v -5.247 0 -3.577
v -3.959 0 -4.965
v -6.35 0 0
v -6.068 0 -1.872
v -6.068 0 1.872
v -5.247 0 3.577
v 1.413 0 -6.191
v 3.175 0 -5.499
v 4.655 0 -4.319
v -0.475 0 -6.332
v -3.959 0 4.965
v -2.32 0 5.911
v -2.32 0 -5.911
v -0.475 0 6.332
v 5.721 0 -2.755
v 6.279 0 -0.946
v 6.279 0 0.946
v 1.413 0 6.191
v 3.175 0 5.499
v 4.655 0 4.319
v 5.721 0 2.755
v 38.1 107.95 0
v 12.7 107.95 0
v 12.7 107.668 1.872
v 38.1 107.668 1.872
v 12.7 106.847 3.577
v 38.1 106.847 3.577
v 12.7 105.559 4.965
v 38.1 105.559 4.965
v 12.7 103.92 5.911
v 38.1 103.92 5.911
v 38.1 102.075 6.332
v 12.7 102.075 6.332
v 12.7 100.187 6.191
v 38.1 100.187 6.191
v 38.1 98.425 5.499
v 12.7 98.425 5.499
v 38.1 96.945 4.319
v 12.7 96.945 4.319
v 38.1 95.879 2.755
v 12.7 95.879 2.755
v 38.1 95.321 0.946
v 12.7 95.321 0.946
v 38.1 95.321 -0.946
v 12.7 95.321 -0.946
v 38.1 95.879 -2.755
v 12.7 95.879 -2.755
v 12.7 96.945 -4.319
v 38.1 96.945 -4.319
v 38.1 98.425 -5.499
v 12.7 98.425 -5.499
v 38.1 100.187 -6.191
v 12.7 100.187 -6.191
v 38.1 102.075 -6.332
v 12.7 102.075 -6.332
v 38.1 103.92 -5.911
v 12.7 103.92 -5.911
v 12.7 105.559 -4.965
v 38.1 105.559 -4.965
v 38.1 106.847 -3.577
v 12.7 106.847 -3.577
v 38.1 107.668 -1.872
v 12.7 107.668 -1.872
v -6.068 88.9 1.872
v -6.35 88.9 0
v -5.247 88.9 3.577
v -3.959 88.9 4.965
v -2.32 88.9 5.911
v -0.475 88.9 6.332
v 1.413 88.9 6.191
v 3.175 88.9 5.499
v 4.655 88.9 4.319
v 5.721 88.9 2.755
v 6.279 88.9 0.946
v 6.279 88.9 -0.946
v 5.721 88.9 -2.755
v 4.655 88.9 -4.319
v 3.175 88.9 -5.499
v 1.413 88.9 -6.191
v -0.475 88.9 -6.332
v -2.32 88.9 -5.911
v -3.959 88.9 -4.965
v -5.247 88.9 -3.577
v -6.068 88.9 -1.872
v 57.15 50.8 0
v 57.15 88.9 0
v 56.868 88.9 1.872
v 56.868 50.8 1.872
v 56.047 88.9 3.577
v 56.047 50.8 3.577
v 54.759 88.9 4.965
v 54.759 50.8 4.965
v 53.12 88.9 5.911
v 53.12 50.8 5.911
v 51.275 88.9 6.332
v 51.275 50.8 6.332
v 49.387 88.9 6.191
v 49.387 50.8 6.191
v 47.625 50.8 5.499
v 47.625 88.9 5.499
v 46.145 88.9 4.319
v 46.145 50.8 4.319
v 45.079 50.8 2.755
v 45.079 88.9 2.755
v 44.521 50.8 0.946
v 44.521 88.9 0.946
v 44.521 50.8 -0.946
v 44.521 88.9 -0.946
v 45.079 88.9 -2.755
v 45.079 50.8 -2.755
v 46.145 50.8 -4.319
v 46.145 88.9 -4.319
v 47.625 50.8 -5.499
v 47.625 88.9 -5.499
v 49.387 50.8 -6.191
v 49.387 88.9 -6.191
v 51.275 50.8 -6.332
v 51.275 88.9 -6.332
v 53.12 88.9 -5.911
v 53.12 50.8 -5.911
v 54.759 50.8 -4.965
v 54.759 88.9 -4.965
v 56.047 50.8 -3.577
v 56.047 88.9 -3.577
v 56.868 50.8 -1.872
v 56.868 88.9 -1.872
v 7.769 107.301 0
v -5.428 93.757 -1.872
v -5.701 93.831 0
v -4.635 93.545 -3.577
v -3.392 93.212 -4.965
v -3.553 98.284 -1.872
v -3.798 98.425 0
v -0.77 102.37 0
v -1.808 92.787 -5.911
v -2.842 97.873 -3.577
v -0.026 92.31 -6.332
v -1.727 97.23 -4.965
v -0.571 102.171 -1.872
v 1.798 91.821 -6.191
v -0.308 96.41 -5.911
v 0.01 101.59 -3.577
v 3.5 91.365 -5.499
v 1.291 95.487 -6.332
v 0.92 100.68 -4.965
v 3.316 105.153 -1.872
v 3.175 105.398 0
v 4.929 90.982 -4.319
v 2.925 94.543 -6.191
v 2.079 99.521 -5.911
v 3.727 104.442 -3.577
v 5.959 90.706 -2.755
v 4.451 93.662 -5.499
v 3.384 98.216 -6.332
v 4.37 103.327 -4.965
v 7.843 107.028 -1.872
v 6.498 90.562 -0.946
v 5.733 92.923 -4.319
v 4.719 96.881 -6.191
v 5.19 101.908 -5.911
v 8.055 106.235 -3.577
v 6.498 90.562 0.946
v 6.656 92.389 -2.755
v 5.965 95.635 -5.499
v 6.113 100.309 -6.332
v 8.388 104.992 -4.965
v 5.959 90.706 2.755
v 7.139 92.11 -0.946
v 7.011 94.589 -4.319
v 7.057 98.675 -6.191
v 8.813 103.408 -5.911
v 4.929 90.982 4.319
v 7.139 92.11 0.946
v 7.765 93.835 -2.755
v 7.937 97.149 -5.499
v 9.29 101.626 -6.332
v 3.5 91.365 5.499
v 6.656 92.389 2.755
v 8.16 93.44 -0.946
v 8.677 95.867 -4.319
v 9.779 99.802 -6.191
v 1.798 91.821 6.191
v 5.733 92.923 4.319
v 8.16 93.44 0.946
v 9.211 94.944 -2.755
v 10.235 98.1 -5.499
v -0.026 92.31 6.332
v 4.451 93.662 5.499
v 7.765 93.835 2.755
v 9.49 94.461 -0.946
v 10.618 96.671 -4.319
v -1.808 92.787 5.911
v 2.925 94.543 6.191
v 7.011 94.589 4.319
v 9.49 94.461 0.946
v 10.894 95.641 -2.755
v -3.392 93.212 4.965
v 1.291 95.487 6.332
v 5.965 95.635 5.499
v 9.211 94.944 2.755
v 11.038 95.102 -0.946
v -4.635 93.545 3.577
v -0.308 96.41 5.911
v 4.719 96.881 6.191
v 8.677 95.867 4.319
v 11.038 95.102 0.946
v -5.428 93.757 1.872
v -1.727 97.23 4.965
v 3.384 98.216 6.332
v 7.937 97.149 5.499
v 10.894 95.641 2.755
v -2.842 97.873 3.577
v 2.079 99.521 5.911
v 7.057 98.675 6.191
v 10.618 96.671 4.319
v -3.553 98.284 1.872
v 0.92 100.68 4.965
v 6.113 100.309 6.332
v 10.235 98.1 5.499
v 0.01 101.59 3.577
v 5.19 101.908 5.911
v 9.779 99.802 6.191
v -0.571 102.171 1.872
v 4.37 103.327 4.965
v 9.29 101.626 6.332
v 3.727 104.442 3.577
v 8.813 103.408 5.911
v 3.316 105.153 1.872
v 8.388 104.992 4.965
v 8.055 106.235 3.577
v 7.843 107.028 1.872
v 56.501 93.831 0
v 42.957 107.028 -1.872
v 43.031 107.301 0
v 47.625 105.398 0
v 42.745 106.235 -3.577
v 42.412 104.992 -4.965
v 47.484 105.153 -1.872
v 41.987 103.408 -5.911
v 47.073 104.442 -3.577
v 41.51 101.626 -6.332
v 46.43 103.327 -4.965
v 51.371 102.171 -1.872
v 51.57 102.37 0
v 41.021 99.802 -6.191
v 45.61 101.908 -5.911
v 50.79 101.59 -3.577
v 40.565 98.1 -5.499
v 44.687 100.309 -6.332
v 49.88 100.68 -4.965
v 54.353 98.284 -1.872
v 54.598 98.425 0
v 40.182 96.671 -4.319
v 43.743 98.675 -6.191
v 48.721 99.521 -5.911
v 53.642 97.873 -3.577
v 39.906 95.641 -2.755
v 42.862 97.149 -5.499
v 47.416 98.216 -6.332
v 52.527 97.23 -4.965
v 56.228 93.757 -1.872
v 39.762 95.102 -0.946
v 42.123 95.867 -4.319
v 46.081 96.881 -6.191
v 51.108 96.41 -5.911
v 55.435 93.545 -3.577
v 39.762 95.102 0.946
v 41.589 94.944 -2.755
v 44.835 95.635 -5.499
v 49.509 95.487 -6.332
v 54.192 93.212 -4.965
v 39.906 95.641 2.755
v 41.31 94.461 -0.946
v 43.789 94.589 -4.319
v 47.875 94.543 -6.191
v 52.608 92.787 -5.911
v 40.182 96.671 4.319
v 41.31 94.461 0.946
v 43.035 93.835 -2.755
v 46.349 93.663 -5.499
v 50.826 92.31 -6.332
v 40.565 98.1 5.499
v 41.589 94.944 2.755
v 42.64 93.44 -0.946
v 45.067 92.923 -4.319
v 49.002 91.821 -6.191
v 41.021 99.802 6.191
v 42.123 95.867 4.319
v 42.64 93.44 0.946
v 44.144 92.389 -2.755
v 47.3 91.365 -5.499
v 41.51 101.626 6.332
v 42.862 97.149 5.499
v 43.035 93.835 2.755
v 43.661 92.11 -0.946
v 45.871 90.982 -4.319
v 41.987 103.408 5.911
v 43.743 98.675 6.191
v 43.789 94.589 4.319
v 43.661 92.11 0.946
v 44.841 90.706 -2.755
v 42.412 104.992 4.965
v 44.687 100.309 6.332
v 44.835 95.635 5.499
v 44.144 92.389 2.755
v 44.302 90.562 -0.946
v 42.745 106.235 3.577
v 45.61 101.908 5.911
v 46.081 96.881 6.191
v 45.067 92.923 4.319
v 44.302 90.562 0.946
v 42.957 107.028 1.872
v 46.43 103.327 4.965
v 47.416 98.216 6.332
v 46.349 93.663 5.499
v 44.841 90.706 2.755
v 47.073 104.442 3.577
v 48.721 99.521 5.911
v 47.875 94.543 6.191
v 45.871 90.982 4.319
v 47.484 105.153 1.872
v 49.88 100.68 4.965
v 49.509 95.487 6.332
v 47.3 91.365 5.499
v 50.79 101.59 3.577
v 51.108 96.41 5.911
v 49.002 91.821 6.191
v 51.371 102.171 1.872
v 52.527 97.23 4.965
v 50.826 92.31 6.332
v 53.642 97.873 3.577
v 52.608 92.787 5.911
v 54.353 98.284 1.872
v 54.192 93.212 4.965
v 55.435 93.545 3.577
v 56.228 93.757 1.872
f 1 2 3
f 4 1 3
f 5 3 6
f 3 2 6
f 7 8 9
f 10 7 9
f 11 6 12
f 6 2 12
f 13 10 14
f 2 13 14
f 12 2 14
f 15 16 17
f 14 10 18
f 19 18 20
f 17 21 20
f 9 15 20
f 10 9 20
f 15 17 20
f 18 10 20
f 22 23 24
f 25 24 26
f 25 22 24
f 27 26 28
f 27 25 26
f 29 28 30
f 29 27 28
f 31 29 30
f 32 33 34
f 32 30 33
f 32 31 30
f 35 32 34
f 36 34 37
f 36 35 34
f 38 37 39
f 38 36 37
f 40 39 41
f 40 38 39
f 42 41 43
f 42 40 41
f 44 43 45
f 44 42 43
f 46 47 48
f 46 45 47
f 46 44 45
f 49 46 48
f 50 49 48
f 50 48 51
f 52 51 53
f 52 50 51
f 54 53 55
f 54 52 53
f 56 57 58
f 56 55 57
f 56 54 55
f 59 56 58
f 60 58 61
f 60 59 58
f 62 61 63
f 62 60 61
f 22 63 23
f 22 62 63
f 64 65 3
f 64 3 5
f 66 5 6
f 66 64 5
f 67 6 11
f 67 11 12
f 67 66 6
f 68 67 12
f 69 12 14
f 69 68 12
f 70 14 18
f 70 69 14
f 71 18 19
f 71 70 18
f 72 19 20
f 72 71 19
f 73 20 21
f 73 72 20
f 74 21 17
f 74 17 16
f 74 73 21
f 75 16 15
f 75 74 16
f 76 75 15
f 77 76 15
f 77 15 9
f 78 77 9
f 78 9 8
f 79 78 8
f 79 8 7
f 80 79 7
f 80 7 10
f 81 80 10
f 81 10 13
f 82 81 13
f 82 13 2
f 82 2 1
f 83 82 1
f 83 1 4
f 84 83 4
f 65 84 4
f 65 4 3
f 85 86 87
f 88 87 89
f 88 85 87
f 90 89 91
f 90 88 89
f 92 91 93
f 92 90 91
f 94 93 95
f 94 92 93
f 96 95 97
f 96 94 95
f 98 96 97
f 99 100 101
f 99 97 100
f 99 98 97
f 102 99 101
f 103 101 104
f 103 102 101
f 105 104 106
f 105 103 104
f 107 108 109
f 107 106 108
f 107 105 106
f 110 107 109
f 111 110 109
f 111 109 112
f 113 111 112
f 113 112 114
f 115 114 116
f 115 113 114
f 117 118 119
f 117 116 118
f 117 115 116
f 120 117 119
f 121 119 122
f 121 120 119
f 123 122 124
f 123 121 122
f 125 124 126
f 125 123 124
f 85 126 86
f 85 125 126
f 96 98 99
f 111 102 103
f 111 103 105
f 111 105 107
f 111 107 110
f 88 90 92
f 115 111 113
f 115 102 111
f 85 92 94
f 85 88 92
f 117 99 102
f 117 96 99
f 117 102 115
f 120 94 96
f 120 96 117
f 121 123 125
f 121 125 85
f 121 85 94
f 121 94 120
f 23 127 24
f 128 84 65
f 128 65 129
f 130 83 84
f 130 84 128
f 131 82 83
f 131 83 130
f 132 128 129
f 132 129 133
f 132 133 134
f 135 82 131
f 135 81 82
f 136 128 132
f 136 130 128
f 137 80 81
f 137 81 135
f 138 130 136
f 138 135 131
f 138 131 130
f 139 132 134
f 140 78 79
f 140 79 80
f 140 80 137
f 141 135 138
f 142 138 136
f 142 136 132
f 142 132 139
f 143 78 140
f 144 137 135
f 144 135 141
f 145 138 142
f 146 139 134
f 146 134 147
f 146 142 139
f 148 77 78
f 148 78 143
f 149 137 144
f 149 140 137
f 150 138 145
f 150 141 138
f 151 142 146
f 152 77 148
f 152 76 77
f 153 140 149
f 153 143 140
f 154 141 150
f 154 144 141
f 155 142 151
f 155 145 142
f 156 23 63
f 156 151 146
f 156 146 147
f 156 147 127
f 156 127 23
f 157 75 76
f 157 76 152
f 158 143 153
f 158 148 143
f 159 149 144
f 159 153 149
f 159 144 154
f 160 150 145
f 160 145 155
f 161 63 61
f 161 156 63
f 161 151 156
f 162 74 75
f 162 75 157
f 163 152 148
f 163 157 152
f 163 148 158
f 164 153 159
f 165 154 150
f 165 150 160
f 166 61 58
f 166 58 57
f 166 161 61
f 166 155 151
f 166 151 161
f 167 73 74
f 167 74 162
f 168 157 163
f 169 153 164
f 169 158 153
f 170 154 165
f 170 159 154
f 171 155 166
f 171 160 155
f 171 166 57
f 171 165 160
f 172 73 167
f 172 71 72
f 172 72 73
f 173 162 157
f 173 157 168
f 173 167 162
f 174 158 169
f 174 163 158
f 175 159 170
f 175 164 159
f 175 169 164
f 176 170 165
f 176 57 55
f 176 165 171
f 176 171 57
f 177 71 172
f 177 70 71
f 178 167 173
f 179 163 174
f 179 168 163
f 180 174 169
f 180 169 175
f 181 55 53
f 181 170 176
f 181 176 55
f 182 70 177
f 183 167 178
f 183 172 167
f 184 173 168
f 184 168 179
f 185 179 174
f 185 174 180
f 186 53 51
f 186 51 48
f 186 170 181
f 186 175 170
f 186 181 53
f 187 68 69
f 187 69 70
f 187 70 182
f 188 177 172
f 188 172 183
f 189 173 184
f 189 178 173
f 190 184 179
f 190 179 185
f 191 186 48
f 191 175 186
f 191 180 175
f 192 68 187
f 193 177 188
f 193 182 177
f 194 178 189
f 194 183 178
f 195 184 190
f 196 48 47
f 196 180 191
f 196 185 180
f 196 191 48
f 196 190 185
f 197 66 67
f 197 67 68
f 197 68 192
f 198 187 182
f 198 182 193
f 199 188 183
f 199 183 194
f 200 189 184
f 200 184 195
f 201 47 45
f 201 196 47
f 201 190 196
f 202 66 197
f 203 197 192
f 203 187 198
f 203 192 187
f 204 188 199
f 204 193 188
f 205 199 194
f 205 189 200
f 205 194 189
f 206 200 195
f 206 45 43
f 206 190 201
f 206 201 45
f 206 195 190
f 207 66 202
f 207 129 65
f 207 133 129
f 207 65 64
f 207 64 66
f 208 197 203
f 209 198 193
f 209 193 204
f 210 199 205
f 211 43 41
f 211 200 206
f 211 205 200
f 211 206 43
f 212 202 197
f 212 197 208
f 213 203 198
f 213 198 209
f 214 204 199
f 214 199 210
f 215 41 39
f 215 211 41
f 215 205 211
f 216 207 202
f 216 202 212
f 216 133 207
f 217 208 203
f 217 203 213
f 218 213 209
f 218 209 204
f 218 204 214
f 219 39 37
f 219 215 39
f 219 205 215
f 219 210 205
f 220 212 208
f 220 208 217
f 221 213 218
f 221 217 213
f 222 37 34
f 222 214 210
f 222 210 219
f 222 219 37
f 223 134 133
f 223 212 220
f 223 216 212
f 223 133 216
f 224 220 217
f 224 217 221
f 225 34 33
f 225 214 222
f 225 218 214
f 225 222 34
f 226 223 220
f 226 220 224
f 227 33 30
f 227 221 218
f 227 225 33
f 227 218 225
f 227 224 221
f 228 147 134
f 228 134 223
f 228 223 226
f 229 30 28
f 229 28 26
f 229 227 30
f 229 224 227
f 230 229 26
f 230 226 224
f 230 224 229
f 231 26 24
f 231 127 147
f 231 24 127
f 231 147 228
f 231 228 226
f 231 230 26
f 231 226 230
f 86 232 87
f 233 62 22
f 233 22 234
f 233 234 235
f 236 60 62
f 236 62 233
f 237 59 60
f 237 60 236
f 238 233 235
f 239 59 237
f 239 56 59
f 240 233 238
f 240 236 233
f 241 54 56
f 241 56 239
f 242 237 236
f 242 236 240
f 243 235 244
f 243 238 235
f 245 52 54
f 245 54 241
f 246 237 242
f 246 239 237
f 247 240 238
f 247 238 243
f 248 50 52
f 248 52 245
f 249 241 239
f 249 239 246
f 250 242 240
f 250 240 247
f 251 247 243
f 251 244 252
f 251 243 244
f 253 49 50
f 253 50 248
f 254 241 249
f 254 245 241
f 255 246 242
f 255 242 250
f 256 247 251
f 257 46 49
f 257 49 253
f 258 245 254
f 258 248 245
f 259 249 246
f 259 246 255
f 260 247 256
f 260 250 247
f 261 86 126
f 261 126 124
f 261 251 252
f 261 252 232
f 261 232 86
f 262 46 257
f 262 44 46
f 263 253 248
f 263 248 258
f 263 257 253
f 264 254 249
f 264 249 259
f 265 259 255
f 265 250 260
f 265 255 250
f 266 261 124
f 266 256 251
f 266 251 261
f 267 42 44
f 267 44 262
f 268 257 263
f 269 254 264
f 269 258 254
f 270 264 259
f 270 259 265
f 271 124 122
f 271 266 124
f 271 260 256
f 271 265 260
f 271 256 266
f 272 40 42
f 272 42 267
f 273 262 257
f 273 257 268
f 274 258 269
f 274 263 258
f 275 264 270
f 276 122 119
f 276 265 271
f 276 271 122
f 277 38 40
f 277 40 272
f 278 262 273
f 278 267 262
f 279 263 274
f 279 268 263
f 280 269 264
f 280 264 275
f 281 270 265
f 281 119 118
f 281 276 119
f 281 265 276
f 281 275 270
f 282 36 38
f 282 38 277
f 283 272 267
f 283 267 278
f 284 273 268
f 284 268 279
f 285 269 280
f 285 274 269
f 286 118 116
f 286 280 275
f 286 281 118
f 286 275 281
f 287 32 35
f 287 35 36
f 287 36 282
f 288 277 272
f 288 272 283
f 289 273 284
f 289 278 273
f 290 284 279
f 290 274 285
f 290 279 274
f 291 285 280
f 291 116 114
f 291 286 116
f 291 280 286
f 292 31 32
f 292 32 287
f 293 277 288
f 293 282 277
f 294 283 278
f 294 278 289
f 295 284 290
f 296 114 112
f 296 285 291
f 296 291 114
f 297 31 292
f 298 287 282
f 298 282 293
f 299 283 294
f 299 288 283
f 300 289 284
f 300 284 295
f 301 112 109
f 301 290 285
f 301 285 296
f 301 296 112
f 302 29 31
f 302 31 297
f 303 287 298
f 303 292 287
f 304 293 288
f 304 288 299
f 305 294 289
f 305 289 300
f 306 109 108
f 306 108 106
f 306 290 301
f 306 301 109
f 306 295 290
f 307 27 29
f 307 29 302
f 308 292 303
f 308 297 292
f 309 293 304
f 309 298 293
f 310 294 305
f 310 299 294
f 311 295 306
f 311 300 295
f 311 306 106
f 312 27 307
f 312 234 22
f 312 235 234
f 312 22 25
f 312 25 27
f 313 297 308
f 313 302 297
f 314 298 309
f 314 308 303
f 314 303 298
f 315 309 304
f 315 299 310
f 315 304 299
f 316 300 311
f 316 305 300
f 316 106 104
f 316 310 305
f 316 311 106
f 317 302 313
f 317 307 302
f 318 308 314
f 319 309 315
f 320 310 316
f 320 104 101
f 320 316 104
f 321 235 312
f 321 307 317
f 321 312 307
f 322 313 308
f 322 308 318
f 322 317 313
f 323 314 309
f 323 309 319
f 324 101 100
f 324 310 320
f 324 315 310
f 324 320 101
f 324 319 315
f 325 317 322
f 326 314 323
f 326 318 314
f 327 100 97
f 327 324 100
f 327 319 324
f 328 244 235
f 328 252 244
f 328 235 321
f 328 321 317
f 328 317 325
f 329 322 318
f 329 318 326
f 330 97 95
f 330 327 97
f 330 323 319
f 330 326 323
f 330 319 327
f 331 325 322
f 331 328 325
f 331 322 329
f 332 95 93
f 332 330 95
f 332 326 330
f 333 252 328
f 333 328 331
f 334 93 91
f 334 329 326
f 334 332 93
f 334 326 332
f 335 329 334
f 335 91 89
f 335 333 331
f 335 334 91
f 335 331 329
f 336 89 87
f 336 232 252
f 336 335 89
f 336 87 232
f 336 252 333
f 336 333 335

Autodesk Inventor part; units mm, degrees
ref_plane "YZ Plane" through (0, 0, 0) normal (1, 0, 0) x (0, 1, 0)
ref_plane "XZ Plane" through (0, 0, 0) normal (0, 1, 0) x (-1, 0, 0)
ref_plane "XY Plane" through (0, 0, 0) normal (0, 0, 1) x (1, 0, 0)
sketch "Sketch1" plane through (0, 0, 0) normal (0, 0, 1) x (1, 0, 0)
  line L0 (0, 0) -> (0, 88.9)
  line L1 (12.7, 101.6) -> (38.1, 101.6)
  line L2 (50.8, 88.9) -> (50.8, 50.8)
  arc A0 (12.7, 101.6) -> (0, 88.9) centre (12.7, 88.9) ccw
  arc A1 (50.8, 88.9) -> (38.1, 101.6) centre (38.1, 88.9) ccw
  point P0 (0, 101.6)
  point P1 (50.8, 101.6)
  dimension "d0" = 101.6
  dimension "d1" = 50.8
  dimension "d2" = 50.8
  dimension "d3" = 12.7
sketch "Sketch2" plane through (0, 0, 0) normal (0, 1, 0) x (-1, 0, 0)
  circle A0 centre (0, 0) radius 6.35
  dimension "d4" = 12.7
sweep "Sweep1" add profiles "Sketch2" path "Sketch1"
properties part number "SimpleHook"
